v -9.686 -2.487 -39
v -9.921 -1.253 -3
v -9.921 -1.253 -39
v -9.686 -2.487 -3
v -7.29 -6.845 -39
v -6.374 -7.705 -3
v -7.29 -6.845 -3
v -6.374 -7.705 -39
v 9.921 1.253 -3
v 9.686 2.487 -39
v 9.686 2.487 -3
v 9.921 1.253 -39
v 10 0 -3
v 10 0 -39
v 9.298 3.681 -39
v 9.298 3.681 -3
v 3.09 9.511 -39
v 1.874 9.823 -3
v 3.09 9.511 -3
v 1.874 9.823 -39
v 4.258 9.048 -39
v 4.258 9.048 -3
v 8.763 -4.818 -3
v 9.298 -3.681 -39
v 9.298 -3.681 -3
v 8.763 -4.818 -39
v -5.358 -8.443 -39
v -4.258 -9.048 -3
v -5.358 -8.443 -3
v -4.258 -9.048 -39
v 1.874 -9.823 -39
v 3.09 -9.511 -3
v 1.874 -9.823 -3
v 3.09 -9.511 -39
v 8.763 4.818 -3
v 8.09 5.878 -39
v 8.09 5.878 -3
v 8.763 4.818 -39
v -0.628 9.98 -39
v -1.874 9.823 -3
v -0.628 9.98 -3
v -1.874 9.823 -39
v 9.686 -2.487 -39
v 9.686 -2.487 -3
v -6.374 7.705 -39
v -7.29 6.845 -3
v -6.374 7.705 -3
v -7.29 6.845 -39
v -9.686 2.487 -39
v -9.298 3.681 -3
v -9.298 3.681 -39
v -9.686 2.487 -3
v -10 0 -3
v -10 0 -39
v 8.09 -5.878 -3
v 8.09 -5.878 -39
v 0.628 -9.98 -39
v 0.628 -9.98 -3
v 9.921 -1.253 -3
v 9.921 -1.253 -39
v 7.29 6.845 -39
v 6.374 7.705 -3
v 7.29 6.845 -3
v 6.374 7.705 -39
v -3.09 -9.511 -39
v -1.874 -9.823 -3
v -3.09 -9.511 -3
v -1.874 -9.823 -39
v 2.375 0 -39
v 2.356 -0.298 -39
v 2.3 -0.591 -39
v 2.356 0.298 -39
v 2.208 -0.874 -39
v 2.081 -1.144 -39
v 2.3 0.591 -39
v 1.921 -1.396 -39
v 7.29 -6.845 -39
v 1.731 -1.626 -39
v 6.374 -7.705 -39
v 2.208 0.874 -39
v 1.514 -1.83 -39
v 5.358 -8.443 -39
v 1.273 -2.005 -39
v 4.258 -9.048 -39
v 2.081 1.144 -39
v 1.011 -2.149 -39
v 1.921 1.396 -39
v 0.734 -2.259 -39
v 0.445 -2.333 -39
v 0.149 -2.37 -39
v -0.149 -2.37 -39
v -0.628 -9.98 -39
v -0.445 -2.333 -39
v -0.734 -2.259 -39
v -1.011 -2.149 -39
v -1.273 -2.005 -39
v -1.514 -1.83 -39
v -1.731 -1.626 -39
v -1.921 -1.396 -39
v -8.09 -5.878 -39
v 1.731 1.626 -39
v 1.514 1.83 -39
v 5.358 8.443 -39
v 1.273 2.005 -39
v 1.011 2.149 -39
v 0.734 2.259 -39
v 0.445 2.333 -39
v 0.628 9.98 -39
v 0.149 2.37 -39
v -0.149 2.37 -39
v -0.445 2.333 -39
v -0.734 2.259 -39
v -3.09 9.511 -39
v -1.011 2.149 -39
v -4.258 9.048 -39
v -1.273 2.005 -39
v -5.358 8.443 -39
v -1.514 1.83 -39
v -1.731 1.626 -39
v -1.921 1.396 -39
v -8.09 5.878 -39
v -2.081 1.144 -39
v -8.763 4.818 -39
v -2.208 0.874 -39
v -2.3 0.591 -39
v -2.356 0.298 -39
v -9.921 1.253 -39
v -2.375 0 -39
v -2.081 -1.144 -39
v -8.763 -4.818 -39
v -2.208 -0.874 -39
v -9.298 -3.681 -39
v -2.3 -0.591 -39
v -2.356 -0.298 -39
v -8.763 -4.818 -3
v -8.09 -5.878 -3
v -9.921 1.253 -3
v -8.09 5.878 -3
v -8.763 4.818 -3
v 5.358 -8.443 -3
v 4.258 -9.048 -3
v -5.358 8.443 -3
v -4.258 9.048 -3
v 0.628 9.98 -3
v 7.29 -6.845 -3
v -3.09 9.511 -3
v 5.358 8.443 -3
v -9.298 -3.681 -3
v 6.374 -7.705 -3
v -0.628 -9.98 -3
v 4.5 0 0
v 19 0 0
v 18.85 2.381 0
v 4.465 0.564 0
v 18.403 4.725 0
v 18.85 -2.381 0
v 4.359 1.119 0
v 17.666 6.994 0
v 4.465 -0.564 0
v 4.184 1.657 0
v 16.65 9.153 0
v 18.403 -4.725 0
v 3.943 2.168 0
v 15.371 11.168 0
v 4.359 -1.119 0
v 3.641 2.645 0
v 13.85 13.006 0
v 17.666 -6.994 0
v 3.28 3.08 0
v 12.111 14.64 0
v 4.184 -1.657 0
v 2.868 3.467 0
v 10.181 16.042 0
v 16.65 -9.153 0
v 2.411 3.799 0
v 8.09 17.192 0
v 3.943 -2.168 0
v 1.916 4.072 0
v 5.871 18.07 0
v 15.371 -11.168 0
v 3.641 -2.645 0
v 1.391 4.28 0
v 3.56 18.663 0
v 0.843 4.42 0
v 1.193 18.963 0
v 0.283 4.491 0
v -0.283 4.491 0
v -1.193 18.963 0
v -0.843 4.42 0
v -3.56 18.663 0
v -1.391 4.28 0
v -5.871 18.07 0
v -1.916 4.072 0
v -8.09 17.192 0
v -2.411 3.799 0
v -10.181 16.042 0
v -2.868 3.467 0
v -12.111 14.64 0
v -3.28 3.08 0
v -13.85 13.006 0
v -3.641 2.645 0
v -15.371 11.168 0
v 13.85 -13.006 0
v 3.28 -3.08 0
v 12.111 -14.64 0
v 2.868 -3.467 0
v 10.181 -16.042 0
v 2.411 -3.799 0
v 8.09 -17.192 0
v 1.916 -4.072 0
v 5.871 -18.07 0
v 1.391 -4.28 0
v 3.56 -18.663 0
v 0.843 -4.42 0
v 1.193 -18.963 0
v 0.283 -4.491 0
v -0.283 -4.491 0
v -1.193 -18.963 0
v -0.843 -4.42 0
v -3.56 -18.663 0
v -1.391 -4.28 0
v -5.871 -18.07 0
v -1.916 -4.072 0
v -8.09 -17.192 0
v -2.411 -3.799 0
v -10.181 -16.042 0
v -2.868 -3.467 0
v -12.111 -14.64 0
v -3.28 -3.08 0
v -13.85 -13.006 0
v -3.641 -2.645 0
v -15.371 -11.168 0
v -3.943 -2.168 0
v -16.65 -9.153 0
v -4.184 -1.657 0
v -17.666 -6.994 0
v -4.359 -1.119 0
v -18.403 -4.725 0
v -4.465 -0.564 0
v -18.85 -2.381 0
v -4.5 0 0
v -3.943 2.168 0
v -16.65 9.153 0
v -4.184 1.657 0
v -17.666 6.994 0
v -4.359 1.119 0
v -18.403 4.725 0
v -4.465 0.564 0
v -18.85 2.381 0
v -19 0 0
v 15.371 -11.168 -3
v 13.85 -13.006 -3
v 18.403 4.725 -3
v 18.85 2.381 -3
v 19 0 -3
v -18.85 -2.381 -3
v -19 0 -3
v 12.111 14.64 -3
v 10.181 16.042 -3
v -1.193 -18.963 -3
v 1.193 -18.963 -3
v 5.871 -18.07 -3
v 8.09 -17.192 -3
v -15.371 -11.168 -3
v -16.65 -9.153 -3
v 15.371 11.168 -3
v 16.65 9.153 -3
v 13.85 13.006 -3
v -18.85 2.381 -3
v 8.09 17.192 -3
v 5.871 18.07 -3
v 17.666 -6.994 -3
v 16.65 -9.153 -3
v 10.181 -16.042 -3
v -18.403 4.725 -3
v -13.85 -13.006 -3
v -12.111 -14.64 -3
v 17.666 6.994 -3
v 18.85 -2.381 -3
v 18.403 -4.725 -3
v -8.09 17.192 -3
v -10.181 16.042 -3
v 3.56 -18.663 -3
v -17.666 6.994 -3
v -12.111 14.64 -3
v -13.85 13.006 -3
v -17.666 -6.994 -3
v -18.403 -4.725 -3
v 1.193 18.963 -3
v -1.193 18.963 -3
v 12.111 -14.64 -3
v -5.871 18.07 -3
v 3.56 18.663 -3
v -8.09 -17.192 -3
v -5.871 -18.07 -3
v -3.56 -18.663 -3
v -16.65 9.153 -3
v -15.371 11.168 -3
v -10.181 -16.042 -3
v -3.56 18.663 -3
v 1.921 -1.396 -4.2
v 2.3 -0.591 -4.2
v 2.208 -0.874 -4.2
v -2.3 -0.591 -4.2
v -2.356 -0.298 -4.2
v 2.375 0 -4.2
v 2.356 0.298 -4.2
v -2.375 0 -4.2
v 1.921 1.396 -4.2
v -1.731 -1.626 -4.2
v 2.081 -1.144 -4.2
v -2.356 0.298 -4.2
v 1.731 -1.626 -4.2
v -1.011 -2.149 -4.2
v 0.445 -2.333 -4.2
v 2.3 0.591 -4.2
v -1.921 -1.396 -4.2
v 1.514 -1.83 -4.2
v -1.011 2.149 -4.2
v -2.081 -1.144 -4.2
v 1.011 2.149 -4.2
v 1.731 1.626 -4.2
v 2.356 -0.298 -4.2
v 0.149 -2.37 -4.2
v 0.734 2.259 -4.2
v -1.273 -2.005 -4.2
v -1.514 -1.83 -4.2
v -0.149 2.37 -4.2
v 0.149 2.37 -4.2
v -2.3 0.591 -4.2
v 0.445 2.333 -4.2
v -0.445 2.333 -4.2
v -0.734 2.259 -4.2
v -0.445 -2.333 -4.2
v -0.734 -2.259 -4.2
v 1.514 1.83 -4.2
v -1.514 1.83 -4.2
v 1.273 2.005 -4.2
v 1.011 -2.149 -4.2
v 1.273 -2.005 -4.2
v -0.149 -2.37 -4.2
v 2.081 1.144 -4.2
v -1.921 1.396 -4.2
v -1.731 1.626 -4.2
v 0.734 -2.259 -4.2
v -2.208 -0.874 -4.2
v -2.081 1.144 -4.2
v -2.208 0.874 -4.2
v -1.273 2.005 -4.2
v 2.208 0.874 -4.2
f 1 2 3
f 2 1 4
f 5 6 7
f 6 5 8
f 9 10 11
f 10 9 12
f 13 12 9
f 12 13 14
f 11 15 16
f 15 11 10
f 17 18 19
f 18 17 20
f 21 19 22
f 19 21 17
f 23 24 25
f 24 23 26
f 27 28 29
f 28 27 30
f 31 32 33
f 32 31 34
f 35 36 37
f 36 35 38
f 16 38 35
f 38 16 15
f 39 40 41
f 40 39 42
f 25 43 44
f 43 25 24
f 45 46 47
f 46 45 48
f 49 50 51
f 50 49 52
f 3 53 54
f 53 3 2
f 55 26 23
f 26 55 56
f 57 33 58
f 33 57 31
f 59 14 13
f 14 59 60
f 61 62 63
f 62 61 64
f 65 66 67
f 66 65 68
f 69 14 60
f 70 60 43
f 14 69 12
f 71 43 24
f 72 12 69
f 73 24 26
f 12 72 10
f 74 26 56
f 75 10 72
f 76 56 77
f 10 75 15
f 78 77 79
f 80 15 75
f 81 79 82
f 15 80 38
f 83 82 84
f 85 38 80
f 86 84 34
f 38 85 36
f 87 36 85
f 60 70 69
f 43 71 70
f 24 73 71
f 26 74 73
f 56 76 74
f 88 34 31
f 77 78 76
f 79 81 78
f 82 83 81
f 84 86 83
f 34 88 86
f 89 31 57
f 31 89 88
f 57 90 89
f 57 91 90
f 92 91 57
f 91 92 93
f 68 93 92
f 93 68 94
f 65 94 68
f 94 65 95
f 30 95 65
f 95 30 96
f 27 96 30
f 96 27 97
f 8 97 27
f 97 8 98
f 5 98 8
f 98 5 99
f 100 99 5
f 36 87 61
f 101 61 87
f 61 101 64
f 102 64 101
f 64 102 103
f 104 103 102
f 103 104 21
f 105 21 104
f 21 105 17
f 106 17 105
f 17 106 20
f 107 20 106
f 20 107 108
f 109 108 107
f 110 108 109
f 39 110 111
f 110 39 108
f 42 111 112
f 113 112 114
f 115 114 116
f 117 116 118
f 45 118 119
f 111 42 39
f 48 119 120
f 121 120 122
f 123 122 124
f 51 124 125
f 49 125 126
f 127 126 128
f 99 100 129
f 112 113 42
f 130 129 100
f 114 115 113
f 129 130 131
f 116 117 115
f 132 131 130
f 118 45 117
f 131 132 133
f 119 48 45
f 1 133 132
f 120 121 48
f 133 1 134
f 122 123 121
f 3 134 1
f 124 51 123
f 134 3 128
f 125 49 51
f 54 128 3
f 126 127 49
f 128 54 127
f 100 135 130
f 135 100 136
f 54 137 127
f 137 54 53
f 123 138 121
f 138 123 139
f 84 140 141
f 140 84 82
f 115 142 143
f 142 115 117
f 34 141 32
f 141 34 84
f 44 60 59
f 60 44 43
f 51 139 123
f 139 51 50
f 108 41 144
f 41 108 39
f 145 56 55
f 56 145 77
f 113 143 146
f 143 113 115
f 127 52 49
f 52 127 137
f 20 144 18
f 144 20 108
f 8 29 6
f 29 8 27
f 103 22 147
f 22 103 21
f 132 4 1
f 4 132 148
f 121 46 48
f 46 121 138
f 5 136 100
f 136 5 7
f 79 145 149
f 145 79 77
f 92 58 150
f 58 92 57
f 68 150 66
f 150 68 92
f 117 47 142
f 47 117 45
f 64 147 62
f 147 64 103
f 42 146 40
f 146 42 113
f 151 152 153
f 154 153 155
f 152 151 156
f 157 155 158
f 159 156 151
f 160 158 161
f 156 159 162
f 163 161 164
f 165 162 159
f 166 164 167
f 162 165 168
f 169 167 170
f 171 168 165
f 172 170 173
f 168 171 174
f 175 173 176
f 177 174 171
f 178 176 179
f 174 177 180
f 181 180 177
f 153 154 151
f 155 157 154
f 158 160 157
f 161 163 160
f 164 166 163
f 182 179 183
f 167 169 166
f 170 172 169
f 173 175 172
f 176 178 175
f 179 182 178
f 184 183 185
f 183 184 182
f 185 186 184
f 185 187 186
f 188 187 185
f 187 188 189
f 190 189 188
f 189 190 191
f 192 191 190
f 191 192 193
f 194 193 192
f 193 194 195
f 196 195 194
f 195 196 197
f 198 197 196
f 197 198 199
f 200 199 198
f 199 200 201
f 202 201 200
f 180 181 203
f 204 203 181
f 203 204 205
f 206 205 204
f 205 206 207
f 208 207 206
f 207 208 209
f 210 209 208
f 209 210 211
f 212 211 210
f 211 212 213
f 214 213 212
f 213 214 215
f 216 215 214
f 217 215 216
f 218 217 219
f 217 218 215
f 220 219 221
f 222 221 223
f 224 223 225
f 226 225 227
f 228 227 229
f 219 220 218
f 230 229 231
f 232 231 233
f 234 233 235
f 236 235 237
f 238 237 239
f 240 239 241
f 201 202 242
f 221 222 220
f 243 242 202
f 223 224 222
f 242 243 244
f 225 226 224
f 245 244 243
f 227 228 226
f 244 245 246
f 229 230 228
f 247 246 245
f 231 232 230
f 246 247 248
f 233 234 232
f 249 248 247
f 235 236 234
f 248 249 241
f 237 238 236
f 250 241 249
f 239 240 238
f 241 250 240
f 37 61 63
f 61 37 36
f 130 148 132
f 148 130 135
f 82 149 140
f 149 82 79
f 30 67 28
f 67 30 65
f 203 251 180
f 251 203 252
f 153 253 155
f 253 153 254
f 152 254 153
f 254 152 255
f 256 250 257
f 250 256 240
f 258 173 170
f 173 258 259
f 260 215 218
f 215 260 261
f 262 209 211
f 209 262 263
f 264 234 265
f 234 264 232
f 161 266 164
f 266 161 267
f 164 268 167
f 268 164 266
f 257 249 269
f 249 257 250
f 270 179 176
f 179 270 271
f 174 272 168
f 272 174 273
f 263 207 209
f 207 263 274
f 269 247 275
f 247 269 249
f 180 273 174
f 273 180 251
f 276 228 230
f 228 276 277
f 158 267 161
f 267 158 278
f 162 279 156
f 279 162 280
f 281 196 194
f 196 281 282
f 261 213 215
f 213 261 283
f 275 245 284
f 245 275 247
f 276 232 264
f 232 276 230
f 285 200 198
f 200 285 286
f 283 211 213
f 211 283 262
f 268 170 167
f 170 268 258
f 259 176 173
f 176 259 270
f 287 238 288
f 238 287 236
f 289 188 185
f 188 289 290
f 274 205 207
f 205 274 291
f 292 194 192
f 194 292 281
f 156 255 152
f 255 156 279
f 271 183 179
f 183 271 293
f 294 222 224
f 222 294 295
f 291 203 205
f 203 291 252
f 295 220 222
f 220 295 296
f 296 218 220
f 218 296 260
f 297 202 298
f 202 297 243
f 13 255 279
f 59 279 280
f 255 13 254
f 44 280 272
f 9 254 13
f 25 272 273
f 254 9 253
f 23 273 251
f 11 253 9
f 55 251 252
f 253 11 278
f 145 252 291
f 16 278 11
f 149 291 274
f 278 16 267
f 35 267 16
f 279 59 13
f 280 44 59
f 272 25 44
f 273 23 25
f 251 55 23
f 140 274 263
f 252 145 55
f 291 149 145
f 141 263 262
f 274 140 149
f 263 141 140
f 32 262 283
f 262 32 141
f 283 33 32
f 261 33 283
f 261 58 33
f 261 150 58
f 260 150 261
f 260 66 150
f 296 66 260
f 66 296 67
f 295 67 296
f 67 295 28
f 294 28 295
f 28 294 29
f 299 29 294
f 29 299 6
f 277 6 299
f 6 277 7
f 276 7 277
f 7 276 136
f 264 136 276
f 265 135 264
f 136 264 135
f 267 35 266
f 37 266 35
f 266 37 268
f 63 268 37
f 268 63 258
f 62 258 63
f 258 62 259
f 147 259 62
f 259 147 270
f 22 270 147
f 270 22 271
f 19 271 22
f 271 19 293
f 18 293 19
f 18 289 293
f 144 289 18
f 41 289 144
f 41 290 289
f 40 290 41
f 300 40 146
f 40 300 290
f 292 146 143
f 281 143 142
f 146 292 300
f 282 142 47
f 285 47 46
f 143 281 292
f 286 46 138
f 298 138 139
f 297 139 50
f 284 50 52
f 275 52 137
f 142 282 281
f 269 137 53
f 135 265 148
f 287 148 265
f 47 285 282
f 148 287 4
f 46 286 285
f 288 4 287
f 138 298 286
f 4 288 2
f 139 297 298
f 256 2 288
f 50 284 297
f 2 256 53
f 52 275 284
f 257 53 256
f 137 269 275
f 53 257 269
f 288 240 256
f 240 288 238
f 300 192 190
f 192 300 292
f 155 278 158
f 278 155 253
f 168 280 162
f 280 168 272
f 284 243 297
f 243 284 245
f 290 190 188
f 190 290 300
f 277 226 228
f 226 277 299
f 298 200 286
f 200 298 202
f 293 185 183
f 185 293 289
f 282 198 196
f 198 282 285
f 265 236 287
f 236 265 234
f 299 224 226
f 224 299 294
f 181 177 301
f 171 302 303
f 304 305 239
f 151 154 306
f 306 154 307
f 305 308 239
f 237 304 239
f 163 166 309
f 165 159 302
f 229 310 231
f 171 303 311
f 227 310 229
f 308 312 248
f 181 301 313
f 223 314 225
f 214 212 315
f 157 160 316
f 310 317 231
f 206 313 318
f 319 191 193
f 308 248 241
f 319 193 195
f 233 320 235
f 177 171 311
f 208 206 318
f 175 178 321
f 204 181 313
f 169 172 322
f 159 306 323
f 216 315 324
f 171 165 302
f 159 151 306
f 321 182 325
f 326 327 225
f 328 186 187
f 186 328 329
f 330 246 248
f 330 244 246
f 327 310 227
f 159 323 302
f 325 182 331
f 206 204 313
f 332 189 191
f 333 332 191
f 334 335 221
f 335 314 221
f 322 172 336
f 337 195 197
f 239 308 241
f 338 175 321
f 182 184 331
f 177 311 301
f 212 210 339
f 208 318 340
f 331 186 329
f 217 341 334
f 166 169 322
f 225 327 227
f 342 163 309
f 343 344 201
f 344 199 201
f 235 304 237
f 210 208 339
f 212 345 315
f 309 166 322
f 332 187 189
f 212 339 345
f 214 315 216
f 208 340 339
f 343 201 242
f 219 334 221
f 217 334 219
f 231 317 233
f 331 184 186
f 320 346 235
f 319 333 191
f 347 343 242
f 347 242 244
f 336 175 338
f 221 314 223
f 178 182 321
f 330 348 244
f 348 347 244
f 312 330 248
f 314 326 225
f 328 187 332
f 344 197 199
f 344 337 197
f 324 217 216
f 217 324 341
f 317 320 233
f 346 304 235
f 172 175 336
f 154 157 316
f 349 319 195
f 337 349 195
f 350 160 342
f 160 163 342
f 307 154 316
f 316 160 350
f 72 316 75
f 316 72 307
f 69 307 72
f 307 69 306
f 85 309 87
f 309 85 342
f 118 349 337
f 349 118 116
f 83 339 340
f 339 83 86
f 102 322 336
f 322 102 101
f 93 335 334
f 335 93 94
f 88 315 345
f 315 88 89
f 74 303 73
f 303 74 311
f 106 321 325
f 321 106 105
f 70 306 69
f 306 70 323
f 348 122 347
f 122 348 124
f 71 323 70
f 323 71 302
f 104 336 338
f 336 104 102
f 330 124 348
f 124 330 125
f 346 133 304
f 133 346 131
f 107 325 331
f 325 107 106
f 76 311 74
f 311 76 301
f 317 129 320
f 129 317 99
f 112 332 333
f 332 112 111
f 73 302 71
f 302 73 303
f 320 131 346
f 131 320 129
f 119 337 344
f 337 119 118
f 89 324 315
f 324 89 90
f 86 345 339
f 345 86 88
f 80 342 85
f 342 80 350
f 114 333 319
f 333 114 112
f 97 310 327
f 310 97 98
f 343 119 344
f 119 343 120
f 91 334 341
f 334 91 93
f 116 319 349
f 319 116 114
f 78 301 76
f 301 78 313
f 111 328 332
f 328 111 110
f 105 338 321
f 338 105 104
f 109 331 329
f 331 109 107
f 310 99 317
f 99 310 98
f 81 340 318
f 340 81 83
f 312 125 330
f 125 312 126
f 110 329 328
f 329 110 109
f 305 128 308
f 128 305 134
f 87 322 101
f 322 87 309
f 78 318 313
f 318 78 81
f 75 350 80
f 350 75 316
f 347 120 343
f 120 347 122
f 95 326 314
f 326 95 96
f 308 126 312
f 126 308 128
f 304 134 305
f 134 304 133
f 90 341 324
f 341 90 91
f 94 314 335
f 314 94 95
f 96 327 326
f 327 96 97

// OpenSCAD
$fn = 50;


difference() {
	union() {
		translate(v = [0, 0, -39.0000000000]) {
			cylinder(h = 39, r = 10.0000000000);
		}
		translate(v = [0, 0, -3.0000000000]) {
			cylinder(h = 3, r = 19.0000000000);
		}
	}
	union() {
		translate(v = [0, 0, 0]) {
			rotate(a = [0, 0, 0]) {
				difference() {
					union() {
						#translate(v = [0, 0, -39.0000000000]) {
							cylinder(h = 39, r = 2.2500000000);
						}
						#translate(v = [0, 0, -4.2000000000]) {
							cylinder(h = 4.2000000000, r = 10.0000000000, r1 = 2.3750000000, r2 = 4.5000000000);
						}
						#translate(v = [0, 0, -39.0000000000]) {
							cylinder(h = 39, r = 2.3750000000);
						}
						#translate(v = [0, 0, -39.0000000000]) {
							cylinder(h = 39, r = 2.2500000000);
						}
					}
					union();
				}
			}
		}
	}
}
